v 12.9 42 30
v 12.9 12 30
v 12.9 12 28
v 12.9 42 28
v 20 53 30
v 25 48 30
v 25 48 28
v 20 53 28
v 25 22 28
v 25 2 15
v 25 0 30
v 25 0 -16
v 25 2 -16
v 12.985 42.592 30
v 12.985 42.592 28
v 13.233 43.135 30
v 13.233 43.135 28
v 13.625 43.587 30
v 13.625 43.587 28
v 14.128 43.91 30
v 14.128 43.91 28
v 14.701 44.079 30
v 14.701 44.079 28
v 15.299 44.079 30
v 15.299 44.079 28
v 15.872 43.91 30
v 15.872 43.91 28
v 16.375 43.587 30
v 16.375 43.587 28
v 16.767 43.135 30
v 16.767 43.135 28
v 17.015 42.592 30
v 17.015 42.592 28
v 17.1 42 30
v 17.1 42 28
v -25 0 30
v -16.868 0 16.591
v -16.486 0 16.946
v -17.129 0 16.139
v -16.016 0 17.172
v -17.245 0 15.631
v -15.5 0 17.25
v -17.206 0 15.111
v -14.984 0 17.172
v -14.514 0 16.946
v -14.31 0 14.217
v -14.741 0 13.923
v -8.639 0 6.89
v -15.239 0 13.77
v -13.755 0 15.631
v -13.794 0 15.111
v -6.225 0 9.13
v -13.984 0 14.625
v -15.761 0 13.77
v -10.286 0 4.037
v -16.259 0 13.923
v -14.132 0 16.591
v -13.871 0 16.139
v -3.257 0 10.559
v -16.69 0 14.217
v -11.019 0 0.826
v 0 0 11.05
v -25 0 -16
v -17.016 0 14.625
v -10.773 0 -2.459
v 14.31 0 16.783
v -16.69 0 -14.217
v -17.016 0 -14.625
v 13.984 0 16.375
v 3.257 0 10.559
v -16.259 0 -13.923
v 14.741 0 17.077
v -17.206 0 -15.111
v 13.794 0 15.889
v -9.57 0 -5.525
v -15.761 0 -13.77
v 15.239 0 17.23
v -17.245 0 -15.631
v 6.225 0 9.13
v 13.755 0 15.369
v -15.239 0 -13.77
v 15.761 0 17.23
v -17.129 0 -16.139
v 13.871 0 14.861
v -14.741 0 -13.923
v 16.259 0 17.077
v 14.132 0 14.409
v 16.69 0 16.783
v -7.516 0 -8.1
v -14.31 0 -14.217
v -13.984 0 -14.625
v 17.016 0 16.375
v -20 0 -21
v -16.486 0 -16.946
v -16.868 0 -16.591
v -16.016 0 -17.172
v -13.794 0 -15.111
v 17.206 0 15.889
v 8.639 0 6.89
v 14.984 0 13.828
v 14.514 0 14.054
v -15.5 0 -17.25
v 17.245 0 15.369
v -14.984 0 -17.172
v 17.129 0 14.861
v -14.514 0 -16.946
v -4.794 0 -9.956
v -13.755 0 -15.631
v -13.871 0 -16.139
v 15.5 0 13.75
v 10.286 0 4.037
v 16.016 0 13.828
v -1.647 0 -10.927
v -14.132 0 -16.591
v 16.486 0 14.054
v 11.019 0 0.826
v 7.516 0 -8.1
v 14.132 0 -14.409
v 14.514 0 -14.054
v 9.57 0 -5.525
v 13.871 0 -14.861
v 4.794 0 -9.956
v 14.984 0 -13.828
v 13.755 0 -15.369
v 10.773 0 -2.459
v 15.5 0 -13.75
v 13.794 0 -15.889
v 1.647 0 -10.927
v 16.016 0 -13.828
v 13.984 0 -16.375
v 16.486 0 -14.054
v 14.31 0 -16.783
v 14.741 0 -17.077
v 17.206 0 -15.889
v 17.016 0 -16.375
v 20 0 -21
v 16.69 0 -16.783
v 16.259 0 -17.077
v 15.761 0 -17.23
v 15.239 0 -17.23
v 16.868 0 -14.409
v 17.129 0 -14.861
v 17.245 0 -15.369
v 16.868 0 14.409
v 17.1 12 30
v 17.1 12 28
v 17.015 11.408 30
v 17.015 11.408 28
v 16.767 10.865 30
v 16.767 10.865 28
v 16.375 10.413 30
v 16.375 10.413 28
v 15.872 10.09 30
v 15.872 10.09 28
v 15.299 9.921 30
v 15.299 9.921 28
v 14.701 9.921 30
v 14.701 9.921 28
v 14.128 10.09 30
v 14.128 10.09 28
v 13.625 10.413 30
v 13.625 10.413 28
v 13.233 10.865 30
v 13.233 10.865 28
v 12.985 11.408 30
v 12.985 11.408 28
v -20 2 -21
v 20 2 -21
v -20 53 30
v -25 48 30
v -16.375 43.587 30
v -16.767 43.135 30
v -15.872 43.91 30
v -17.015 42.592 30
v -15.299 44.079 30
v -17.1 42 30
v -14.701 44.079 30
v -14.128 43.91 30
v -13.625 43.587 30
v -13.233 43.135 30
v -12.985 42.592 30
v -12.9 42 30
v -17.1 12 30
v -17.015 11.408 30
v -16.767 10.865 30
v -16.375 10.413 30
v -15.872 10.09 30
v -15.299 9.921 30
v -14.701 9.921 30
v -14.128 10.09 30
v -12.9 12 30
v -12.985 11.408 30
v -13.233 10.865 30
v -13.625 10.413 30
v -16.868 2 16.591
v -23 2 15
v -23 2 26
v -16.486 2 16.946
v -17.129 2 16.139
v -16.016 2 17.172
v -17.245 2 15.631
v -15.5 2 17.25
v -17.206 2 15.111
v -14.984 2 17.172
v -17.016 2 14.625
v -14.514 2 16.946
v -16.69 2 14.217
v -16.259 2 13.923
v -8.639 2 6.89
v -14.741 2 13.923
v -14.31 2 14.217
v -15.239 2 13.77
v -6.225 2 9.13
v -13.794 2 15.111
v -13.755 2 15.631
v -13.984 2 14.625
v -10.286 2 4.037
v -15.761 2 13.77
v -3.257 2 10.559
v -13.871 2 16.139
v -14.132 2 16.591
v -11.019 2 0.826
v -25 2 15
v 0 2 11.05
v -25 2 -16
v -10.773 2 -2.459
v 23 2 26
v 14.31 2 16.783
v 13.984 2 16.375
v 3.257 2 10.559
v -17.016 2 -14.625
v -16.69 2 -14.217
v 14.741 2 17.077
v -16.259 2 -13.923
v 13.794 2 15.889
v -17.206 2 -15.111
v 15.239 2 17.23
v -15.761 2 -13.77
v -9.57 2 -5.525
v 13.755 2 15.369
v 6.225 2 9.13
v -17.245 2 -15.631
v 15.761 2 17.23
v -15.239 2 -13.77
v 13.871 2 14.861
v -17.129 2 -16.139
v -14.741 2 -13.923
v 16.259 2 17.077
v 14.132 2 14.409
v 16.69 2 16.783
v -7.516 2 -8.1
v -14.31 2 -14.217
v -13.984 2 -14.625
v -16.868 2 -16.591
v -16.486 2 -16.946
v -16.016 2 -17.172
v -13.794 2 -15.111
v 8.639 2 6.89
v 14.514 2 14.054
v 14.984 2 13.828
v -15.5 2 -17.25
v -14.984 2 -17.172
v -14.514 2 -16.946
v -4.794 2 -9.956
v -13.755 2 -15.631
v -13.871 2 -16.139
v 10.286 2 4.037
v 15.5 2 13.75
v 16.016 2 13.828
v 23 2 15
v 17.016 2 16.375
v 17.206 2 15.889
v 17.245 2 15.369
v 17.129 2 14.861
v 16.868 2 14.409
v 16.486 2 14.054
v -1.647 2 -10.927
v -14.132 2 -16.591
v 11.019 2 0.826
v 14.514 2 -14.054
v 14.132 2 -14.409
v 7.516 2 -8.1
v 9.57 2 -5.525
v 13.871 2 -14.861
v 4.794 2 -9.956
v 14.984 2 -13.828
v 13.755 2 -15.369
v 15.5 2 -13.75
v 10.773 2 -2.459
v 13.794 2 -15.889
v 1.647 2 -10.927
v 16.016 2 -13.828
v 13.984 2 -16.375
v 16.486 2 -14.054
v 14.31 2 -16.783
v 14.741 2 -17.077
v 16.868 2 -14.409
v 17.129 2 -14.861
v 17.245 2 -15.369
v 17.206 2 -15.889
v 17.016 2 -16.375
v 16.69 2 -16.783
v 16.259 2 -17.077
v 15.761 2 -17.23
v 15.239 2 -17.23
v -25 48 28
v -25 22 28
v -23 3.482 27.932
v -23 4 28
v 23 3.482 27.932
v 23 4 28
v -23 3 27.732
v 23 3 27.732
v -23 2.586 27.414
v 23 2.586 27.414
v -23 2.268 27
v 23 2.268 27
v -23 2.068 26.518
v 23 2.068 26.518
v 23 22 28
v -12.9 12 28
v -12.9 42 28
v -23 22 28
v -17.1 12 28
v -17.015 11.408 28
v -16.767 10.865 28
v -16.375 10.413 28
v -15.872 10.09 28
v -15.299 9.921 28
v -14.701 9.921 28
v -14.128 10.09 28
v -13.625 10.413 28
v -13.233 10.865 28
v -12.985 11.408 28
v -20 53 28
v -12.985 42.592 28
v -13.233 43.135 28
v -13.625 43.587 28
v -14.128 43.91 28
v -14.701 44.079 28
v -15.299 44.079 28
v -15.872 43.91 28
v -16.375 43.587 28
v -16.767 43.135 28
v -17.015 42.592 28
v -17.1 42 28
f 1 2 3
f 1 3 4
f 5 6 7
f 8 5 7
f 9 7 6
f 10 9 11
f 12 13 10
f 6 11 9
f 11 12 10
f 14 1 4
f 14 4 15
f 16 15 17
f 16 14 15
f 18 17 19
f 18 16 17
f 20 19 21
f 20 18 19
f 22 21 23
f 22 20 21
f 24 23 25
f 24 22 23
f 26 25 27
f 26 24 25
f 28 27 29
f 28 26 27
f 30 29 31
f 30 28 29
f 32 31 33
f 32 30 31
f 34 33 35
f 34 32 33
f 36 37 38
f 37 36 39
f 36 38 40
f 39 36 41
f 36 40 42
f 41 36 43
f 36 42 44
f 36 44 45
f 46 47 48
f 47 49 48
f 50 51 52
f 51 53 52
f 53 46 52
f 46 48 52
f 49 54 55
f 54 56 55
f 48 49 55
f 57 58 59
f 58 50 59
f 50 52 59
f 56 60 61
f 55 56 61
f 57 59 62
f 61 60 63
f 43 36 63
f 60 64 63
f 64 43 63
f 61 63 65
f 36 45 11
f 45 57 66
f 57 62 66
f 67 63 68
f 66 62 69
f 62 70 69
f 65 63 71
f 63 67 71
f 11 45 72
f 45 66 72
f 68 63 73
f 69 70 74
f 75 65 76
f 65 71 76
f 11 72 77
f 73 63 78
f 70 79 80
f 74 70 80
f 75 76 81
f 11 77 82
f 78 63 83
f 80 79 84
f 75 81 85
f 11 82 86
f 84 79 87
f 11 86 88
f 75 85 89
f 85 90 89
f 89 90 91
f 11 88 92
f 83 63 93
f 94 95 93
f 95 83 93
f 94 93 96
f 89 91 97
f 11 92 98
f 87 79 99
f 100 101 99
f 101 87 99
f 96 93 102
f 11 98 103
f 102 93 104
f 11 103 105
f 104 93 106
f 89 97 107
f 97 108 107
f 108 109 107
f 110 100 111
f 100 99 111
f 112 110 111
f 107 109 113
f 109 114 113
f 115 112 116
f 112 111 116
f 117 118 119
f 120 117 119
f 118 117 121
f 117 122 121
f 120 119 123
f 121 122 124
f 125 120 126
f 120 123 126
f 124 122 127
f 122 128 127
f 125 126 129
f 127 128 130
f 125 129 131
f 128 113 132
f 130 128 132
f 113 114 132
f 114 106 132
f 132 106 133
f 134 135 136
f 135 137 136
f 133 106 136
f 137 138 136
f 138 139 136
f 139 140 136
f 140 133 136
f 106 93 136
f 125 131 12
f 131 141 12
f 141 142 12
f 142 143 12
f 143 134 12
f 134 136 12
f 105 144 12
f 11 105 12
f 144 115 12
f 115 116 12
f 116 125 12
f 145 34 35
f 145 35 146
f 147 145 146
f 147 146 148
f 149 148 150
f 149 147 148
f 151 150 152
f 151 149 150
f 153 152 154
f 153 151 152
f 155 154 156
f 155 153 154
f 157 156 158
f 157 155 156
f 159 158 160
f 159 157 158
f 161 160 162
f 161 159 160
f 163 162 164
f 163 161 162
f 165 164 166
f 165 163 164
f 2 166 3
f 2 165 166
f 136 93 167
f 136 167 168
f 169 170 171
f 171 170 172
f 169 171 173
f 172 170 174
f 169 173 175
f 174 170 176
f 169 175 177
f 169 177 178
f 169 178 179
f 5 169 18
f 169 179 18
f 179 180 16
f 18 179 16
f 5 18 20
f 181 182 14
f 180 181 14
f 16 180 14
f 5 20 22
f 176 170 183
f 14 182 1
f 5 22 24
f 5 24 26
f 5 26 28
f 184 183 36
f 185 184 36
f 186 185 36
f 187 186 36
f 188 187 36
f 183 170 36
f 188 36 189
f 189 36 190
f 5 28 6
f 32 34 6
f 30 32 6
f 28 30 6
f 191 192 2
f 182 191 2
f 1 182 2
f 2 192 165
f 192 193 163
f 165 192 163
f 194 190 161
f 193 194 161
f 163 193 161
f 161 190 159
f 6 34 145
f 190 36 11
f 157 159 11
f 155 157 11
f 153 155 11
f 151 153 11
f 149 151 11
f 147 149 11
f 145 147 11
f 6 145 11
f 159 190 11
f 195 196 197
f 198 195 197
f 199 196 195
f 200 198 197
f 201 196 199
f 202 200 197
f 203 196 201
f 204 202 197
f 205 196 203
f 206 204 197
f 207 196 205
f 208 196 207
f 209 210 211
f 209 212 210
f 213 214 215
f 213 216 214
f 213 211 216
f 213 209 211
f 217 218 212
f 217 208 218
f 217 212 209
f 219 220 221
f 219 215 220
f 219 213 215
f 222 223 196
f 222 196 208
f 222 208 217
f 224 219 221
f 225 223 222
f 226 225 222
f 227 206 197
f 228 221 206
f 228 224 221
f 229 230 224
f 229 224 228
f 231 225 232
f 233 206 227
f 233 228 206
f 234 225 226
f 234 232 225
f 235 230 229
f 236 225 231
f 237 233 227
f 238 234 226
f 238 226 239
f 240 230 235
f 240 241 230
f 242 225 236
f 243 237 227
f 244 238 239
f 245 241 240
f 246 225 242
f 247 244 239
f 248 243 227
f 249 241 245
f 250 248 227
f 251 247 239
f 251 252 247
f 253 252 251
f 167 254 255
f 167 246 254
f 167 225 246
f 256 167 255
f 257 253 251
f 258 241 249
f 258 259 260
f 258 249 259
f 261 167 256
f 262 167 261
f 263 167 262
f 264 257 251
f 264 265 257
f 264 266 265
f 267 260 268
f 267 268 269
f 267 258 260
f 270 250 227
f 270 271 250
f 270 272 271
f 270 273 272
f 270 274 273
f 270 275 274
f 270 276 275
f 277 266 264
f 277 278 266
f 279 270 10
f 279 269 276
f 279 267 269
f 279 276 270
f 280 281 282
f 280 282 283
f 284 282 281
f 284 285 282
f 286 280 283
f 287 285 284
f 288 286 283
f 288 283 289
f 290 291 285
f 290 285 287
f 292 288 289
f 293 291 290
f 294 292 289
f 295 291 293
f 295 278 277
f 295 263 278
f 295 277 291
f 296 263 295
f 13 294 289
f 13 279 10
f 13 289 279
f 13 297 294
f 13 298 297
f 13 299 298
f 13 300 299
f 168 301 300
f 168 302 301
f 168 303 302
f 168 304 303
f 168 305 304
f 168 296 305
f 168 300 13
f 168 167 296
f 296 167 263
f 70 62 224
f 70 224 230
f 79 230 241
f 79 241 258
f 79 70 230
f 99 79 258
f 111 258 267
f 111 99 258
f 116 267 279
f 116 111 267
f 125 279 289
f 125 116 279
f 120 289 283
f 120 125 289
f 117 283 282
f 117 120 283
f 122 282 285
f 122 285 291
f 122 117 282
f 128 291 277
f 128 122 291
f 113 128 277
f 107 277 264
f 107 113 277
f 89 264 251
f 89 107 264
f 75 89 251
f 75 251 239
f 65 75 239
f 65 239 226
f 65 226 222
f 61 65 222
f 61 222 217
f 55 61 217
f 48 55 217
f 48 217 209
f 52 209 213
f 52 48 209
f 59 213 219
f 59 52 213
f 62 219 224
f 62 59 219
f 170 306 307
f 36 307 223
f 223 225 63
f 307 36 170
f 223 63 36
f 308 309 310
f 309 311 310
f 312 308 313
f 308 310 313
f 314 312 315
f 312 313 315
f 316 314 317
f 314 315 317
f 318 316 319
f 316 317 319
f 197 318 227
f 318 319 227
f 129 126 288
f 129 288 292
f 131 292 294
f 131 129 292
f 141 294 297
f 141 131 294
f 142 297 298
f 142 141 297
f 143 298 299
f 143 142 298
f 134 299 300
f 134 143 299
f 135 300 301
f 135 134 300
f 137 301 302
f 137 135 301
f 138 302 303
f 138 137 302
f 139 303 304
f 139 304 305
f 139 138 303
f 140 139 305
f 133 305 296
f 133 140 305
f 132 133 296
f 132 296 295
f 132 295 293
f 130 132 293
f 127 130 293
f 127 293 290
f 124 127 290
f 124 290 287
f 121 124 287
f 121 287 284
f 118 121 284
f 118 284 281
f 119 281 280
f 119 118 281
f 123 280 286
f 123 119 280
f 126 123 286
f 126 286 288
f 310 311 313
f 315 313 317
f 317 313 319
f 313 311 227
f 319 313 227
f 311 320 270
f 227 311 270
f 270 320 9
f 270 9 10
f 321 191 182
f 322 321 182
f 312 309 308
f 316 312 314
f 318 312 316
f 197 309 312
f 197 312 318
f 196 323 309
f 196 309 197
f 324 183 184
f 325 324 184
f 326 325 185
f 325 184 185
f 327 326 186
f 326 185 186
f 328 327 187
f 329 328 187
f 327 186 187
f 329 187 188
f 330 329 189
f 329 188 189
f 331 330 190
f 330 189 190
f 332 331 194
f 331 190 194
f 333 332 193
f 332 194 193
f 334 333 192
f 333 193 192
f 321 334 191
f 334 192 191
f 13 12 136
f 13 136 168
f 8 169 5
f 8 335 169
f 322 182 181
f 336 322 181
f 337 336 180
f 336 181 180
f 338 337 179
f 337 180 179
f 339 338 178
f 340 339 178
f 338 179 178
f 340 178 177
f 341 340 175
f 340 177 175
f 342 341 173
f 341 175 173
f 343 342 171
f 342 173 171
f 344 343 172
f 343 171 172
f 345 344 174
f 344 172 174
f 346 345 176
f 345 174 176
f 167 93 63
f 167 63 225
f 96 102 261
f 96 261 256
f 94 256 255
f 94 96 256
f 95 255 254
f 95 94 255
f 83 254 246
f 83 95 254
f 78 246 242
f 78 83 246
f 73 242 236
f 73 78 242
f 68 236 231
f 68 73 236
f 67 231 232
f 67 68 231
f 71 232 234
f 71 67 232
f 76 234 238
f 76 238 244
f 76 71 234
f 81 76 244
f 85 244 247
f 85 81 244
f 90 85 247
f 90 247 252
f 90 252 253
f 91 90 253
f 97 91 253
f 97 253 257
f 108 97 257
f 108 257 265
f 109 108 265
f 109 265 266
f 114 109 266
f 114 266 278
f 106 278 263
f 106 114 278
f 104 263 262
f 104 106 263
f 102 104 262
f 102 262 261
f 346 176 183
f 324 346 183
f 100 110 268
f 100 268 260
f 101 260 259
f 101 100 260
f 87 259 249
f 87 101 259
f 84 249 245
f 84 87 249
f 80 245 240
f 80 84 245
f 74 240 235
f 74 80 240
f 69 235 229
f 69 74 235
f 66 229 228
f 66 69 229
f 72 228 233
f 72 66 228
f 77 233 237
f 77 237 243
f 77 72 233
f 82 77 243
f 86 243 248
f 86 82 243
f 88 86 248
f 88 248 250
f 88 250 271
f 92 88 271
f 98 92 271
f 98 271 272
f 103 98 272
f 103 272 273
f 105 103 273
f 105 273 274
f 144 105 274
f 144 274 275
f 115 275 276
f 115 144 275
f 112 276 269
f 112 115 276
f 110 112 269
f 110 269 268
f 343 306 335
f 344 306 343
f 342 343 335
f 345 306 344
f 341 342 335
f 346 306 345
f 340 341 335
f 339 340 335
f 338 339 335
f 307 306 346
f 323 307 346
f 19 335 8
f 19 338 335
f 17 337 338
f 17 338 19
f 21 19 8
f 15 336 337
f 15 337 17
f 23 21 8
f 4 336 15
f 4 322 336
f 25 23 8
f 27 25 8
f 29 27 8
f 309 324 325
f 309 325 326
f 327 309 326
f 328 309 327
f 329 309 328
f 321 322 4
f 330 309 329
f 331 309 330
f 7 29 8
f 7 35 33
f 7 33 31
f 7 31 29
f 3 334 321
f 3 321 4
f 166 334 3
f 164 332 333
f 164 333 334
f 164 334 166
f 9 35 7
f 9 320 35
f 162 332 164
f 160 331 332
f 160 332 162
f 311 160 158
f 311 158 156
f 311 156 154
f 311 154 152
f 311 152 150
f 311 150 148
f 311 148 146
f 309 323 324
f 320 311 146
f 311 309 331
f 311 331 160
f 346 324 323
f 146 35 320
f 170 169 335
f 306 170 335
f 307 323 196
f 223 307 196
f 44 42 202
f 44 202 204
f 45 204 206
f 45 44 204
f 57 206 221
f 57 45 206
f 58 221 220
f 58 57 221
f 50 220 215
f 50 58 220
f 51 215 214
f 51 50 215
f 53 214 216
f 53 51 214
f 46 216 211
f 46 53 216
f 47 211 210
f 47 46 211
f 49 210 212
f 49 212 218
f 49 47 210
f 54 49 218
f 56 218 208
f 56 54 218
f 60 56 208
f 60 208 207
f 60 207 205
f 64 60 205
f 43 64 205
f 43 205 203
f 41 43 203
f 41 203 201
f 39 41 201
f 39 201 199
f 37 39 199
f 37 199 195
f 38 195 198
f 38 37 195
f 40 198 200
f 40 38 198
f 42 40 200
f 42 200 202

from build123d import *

# Parameters (mm, degrees)
SKETCH_1_W               = 50
SKETCH_1_H               = 49
SKETCH_1_R               = 11.05
SKETCH_1_R_2             = 1.75
EXTRUDE_1_DEPTH          = 2
CHAMFER_1_SIZE           = 5
SKETCH_3_W               = 50
SKETCH_3_H               = 2
EXTRUDE_2_DEPTH          = 53
CHAMFER_2_SIZE           = 5
CHAMFER_3_SIZE           = 5
CUT_EXTRUDE_1_DEPTH      = 77.387171698
CUT_EXTRUDE_1_DEPTH_BACK = 77.387171698
RIB_1_REACH              = 80.797
SKETCH_5_WALL_W          = 183.448137028
SKETCH_5_WALL_H          = 2
FILLET_1_R               = 2


with BuildPart() as part:
    # 草图1 → 凸台-拉伸1 (new body)
    with BuildSketch(Plane(origin=(0, 0, 0), x_dir=(1, 0, 0), z_dir=(0, 1, 0))):
        with Locations((0, -3.5)):
            Rectangle(SKETCH_1_W, SKETCH_1_H)
        with Locations(Location((0, 0, 0), (0, 0, 270))):
            Circle(SKETCH_1_R, mode=Mode.SUBTRACT)
        with Locations(Location((15.5, 15.5, 0), (0, 0, 270))):
            Circle(SKETCH_1_R_2, mode=Mode.SUBTRACT)
        with Locations(Location((15.5, -15.5, 0), (0, 0, 90))):
            Circle(SKETCH_1_R_2, mode=Mode.SUBTRACT)
        with Locations(Location((-15.5, -15.5, 0), (0, 0, 270))):
            Circle(SKETCH_1_R_2, mode=Mode.SUBTRACT)
        with Locations(Location((-15.5, 15.5, 0), (0, 0, 90))):
            Circle(SKETCH_1_R_2, mode=Mode.SUBTRACT)
    extrude(amount=EXTRUDE_1_DEPTH)

    # 倒角1
    chamfer_1_edges = [part.edges().sort_by_distance(p)[0] for p in [
        (-25, 1, -21),
        (25, 1, -21),
    ]]
    chamfer(chamfer_1_edges, length=CHAMFER_1_SIZE)

    # 草图3 → 凸台-拉伸2 (add)
    with BuildSketch(Plane(origin=(0, 0, 0), x_dir=(1, 0, 0), z_dir=(0, 1, 0))):
        with Locations((0, -29)):
            Rectangle(SKETCH_3_W, SKETCH_3_H)
    extrude(amount=EXTRUDE_2_DEPTH)

    # 倒角2
    chamfer_2_edges = [part.edges().sort_by_distance(p)[0] for p in [
        (-25, 53, 29),
    ]]
    chamfer(chamfer_2_edges, length=CHAMFER_2_SIZE)

    # 倒角3
    chamfer_3_edges = [part.edges().sort_by_distance(p)[0] for p in [
        (25, 53, 29),
    ]]
    chamfer(chamfer_3_edges, length=CHAMFER_3_SIZE)

    # 草图4 → 切除-拉伸1 (cut, two sides: drawn at the far end of the back side and taken through both)
    with BuildSketch(Plane(origin=(0, 0, 28), x_dir=(-1, 0, 0), z_dir=(0, 0, -1)).offset(-CUT_EXTRUDE_1_DEPTH_BACK)):
        with BuildLine():
            Line((-17.1, 42), (-17.1, 12))
            ThreePointArc((-17.1, 12), (-15, 9.9), (-12.9, 12))
            Line((-12.9, 12), (-12.9, 42))
            ThreePointArc((-12.9, 42), (-15, 44.1), (-17.1, 42))
        make_face()
        with BuildLine():
            ThreePointArc((17.1, 12), (15, 9.9), (12.9, 12))
            Line((12.9, 12), (12.9, 42))
            ThreePointArc((12.9, 42), (15, 44.1), (17.1, 42))
            Line((17.1, 42), (17.1, 12))
        make_face()
    extrude(amount=CUT_EXTRUDE_1_DEPTH + CUT_EXTRUDE_1_DEPTH_BACK, mode=Mode.SUBTRACT)

    # 草图5 wall → 筋1 (add, up to next)
    with BuildSketch(Plane(origin=(25, 12, 21.5), x_dir=(0, -0.838443616301, -0.544988350595), z_dir=(0, 0.544988350595, -0.838443616301)), mode=Mode.PRIVATE) as rib_1_sk1:
        with Locations((0, 1)):
            Rectangle(SKETCH_5_WALL_W, SKETCH_5_WALL_H)
    rib_1_tool1 = extrude(rib_1_sk1.sketch, amount=-RIB_1_REACH, mode=Mode.PRIVATE) - part.part
    rib_1 = rib_1_tool1.solids().sort_by_distance((25, 12, 21.5))[0]
    add(rib_1)

    # 镜向1: 筋1 across plane
    add(rib_1.mirror(Plane(origin=(0, 0, 0), x_dir=(0, 0, 1), z_dir=(1, 0, 0))))

    # 圆角1
    fillet_1_edges = [part.edges().sort_by_distance(p)[0] for p in [
        (0, 2, 28),
    ]]
    fillet(fillet_1_edges, radius=FILLET_1_R)


solid = part.part
